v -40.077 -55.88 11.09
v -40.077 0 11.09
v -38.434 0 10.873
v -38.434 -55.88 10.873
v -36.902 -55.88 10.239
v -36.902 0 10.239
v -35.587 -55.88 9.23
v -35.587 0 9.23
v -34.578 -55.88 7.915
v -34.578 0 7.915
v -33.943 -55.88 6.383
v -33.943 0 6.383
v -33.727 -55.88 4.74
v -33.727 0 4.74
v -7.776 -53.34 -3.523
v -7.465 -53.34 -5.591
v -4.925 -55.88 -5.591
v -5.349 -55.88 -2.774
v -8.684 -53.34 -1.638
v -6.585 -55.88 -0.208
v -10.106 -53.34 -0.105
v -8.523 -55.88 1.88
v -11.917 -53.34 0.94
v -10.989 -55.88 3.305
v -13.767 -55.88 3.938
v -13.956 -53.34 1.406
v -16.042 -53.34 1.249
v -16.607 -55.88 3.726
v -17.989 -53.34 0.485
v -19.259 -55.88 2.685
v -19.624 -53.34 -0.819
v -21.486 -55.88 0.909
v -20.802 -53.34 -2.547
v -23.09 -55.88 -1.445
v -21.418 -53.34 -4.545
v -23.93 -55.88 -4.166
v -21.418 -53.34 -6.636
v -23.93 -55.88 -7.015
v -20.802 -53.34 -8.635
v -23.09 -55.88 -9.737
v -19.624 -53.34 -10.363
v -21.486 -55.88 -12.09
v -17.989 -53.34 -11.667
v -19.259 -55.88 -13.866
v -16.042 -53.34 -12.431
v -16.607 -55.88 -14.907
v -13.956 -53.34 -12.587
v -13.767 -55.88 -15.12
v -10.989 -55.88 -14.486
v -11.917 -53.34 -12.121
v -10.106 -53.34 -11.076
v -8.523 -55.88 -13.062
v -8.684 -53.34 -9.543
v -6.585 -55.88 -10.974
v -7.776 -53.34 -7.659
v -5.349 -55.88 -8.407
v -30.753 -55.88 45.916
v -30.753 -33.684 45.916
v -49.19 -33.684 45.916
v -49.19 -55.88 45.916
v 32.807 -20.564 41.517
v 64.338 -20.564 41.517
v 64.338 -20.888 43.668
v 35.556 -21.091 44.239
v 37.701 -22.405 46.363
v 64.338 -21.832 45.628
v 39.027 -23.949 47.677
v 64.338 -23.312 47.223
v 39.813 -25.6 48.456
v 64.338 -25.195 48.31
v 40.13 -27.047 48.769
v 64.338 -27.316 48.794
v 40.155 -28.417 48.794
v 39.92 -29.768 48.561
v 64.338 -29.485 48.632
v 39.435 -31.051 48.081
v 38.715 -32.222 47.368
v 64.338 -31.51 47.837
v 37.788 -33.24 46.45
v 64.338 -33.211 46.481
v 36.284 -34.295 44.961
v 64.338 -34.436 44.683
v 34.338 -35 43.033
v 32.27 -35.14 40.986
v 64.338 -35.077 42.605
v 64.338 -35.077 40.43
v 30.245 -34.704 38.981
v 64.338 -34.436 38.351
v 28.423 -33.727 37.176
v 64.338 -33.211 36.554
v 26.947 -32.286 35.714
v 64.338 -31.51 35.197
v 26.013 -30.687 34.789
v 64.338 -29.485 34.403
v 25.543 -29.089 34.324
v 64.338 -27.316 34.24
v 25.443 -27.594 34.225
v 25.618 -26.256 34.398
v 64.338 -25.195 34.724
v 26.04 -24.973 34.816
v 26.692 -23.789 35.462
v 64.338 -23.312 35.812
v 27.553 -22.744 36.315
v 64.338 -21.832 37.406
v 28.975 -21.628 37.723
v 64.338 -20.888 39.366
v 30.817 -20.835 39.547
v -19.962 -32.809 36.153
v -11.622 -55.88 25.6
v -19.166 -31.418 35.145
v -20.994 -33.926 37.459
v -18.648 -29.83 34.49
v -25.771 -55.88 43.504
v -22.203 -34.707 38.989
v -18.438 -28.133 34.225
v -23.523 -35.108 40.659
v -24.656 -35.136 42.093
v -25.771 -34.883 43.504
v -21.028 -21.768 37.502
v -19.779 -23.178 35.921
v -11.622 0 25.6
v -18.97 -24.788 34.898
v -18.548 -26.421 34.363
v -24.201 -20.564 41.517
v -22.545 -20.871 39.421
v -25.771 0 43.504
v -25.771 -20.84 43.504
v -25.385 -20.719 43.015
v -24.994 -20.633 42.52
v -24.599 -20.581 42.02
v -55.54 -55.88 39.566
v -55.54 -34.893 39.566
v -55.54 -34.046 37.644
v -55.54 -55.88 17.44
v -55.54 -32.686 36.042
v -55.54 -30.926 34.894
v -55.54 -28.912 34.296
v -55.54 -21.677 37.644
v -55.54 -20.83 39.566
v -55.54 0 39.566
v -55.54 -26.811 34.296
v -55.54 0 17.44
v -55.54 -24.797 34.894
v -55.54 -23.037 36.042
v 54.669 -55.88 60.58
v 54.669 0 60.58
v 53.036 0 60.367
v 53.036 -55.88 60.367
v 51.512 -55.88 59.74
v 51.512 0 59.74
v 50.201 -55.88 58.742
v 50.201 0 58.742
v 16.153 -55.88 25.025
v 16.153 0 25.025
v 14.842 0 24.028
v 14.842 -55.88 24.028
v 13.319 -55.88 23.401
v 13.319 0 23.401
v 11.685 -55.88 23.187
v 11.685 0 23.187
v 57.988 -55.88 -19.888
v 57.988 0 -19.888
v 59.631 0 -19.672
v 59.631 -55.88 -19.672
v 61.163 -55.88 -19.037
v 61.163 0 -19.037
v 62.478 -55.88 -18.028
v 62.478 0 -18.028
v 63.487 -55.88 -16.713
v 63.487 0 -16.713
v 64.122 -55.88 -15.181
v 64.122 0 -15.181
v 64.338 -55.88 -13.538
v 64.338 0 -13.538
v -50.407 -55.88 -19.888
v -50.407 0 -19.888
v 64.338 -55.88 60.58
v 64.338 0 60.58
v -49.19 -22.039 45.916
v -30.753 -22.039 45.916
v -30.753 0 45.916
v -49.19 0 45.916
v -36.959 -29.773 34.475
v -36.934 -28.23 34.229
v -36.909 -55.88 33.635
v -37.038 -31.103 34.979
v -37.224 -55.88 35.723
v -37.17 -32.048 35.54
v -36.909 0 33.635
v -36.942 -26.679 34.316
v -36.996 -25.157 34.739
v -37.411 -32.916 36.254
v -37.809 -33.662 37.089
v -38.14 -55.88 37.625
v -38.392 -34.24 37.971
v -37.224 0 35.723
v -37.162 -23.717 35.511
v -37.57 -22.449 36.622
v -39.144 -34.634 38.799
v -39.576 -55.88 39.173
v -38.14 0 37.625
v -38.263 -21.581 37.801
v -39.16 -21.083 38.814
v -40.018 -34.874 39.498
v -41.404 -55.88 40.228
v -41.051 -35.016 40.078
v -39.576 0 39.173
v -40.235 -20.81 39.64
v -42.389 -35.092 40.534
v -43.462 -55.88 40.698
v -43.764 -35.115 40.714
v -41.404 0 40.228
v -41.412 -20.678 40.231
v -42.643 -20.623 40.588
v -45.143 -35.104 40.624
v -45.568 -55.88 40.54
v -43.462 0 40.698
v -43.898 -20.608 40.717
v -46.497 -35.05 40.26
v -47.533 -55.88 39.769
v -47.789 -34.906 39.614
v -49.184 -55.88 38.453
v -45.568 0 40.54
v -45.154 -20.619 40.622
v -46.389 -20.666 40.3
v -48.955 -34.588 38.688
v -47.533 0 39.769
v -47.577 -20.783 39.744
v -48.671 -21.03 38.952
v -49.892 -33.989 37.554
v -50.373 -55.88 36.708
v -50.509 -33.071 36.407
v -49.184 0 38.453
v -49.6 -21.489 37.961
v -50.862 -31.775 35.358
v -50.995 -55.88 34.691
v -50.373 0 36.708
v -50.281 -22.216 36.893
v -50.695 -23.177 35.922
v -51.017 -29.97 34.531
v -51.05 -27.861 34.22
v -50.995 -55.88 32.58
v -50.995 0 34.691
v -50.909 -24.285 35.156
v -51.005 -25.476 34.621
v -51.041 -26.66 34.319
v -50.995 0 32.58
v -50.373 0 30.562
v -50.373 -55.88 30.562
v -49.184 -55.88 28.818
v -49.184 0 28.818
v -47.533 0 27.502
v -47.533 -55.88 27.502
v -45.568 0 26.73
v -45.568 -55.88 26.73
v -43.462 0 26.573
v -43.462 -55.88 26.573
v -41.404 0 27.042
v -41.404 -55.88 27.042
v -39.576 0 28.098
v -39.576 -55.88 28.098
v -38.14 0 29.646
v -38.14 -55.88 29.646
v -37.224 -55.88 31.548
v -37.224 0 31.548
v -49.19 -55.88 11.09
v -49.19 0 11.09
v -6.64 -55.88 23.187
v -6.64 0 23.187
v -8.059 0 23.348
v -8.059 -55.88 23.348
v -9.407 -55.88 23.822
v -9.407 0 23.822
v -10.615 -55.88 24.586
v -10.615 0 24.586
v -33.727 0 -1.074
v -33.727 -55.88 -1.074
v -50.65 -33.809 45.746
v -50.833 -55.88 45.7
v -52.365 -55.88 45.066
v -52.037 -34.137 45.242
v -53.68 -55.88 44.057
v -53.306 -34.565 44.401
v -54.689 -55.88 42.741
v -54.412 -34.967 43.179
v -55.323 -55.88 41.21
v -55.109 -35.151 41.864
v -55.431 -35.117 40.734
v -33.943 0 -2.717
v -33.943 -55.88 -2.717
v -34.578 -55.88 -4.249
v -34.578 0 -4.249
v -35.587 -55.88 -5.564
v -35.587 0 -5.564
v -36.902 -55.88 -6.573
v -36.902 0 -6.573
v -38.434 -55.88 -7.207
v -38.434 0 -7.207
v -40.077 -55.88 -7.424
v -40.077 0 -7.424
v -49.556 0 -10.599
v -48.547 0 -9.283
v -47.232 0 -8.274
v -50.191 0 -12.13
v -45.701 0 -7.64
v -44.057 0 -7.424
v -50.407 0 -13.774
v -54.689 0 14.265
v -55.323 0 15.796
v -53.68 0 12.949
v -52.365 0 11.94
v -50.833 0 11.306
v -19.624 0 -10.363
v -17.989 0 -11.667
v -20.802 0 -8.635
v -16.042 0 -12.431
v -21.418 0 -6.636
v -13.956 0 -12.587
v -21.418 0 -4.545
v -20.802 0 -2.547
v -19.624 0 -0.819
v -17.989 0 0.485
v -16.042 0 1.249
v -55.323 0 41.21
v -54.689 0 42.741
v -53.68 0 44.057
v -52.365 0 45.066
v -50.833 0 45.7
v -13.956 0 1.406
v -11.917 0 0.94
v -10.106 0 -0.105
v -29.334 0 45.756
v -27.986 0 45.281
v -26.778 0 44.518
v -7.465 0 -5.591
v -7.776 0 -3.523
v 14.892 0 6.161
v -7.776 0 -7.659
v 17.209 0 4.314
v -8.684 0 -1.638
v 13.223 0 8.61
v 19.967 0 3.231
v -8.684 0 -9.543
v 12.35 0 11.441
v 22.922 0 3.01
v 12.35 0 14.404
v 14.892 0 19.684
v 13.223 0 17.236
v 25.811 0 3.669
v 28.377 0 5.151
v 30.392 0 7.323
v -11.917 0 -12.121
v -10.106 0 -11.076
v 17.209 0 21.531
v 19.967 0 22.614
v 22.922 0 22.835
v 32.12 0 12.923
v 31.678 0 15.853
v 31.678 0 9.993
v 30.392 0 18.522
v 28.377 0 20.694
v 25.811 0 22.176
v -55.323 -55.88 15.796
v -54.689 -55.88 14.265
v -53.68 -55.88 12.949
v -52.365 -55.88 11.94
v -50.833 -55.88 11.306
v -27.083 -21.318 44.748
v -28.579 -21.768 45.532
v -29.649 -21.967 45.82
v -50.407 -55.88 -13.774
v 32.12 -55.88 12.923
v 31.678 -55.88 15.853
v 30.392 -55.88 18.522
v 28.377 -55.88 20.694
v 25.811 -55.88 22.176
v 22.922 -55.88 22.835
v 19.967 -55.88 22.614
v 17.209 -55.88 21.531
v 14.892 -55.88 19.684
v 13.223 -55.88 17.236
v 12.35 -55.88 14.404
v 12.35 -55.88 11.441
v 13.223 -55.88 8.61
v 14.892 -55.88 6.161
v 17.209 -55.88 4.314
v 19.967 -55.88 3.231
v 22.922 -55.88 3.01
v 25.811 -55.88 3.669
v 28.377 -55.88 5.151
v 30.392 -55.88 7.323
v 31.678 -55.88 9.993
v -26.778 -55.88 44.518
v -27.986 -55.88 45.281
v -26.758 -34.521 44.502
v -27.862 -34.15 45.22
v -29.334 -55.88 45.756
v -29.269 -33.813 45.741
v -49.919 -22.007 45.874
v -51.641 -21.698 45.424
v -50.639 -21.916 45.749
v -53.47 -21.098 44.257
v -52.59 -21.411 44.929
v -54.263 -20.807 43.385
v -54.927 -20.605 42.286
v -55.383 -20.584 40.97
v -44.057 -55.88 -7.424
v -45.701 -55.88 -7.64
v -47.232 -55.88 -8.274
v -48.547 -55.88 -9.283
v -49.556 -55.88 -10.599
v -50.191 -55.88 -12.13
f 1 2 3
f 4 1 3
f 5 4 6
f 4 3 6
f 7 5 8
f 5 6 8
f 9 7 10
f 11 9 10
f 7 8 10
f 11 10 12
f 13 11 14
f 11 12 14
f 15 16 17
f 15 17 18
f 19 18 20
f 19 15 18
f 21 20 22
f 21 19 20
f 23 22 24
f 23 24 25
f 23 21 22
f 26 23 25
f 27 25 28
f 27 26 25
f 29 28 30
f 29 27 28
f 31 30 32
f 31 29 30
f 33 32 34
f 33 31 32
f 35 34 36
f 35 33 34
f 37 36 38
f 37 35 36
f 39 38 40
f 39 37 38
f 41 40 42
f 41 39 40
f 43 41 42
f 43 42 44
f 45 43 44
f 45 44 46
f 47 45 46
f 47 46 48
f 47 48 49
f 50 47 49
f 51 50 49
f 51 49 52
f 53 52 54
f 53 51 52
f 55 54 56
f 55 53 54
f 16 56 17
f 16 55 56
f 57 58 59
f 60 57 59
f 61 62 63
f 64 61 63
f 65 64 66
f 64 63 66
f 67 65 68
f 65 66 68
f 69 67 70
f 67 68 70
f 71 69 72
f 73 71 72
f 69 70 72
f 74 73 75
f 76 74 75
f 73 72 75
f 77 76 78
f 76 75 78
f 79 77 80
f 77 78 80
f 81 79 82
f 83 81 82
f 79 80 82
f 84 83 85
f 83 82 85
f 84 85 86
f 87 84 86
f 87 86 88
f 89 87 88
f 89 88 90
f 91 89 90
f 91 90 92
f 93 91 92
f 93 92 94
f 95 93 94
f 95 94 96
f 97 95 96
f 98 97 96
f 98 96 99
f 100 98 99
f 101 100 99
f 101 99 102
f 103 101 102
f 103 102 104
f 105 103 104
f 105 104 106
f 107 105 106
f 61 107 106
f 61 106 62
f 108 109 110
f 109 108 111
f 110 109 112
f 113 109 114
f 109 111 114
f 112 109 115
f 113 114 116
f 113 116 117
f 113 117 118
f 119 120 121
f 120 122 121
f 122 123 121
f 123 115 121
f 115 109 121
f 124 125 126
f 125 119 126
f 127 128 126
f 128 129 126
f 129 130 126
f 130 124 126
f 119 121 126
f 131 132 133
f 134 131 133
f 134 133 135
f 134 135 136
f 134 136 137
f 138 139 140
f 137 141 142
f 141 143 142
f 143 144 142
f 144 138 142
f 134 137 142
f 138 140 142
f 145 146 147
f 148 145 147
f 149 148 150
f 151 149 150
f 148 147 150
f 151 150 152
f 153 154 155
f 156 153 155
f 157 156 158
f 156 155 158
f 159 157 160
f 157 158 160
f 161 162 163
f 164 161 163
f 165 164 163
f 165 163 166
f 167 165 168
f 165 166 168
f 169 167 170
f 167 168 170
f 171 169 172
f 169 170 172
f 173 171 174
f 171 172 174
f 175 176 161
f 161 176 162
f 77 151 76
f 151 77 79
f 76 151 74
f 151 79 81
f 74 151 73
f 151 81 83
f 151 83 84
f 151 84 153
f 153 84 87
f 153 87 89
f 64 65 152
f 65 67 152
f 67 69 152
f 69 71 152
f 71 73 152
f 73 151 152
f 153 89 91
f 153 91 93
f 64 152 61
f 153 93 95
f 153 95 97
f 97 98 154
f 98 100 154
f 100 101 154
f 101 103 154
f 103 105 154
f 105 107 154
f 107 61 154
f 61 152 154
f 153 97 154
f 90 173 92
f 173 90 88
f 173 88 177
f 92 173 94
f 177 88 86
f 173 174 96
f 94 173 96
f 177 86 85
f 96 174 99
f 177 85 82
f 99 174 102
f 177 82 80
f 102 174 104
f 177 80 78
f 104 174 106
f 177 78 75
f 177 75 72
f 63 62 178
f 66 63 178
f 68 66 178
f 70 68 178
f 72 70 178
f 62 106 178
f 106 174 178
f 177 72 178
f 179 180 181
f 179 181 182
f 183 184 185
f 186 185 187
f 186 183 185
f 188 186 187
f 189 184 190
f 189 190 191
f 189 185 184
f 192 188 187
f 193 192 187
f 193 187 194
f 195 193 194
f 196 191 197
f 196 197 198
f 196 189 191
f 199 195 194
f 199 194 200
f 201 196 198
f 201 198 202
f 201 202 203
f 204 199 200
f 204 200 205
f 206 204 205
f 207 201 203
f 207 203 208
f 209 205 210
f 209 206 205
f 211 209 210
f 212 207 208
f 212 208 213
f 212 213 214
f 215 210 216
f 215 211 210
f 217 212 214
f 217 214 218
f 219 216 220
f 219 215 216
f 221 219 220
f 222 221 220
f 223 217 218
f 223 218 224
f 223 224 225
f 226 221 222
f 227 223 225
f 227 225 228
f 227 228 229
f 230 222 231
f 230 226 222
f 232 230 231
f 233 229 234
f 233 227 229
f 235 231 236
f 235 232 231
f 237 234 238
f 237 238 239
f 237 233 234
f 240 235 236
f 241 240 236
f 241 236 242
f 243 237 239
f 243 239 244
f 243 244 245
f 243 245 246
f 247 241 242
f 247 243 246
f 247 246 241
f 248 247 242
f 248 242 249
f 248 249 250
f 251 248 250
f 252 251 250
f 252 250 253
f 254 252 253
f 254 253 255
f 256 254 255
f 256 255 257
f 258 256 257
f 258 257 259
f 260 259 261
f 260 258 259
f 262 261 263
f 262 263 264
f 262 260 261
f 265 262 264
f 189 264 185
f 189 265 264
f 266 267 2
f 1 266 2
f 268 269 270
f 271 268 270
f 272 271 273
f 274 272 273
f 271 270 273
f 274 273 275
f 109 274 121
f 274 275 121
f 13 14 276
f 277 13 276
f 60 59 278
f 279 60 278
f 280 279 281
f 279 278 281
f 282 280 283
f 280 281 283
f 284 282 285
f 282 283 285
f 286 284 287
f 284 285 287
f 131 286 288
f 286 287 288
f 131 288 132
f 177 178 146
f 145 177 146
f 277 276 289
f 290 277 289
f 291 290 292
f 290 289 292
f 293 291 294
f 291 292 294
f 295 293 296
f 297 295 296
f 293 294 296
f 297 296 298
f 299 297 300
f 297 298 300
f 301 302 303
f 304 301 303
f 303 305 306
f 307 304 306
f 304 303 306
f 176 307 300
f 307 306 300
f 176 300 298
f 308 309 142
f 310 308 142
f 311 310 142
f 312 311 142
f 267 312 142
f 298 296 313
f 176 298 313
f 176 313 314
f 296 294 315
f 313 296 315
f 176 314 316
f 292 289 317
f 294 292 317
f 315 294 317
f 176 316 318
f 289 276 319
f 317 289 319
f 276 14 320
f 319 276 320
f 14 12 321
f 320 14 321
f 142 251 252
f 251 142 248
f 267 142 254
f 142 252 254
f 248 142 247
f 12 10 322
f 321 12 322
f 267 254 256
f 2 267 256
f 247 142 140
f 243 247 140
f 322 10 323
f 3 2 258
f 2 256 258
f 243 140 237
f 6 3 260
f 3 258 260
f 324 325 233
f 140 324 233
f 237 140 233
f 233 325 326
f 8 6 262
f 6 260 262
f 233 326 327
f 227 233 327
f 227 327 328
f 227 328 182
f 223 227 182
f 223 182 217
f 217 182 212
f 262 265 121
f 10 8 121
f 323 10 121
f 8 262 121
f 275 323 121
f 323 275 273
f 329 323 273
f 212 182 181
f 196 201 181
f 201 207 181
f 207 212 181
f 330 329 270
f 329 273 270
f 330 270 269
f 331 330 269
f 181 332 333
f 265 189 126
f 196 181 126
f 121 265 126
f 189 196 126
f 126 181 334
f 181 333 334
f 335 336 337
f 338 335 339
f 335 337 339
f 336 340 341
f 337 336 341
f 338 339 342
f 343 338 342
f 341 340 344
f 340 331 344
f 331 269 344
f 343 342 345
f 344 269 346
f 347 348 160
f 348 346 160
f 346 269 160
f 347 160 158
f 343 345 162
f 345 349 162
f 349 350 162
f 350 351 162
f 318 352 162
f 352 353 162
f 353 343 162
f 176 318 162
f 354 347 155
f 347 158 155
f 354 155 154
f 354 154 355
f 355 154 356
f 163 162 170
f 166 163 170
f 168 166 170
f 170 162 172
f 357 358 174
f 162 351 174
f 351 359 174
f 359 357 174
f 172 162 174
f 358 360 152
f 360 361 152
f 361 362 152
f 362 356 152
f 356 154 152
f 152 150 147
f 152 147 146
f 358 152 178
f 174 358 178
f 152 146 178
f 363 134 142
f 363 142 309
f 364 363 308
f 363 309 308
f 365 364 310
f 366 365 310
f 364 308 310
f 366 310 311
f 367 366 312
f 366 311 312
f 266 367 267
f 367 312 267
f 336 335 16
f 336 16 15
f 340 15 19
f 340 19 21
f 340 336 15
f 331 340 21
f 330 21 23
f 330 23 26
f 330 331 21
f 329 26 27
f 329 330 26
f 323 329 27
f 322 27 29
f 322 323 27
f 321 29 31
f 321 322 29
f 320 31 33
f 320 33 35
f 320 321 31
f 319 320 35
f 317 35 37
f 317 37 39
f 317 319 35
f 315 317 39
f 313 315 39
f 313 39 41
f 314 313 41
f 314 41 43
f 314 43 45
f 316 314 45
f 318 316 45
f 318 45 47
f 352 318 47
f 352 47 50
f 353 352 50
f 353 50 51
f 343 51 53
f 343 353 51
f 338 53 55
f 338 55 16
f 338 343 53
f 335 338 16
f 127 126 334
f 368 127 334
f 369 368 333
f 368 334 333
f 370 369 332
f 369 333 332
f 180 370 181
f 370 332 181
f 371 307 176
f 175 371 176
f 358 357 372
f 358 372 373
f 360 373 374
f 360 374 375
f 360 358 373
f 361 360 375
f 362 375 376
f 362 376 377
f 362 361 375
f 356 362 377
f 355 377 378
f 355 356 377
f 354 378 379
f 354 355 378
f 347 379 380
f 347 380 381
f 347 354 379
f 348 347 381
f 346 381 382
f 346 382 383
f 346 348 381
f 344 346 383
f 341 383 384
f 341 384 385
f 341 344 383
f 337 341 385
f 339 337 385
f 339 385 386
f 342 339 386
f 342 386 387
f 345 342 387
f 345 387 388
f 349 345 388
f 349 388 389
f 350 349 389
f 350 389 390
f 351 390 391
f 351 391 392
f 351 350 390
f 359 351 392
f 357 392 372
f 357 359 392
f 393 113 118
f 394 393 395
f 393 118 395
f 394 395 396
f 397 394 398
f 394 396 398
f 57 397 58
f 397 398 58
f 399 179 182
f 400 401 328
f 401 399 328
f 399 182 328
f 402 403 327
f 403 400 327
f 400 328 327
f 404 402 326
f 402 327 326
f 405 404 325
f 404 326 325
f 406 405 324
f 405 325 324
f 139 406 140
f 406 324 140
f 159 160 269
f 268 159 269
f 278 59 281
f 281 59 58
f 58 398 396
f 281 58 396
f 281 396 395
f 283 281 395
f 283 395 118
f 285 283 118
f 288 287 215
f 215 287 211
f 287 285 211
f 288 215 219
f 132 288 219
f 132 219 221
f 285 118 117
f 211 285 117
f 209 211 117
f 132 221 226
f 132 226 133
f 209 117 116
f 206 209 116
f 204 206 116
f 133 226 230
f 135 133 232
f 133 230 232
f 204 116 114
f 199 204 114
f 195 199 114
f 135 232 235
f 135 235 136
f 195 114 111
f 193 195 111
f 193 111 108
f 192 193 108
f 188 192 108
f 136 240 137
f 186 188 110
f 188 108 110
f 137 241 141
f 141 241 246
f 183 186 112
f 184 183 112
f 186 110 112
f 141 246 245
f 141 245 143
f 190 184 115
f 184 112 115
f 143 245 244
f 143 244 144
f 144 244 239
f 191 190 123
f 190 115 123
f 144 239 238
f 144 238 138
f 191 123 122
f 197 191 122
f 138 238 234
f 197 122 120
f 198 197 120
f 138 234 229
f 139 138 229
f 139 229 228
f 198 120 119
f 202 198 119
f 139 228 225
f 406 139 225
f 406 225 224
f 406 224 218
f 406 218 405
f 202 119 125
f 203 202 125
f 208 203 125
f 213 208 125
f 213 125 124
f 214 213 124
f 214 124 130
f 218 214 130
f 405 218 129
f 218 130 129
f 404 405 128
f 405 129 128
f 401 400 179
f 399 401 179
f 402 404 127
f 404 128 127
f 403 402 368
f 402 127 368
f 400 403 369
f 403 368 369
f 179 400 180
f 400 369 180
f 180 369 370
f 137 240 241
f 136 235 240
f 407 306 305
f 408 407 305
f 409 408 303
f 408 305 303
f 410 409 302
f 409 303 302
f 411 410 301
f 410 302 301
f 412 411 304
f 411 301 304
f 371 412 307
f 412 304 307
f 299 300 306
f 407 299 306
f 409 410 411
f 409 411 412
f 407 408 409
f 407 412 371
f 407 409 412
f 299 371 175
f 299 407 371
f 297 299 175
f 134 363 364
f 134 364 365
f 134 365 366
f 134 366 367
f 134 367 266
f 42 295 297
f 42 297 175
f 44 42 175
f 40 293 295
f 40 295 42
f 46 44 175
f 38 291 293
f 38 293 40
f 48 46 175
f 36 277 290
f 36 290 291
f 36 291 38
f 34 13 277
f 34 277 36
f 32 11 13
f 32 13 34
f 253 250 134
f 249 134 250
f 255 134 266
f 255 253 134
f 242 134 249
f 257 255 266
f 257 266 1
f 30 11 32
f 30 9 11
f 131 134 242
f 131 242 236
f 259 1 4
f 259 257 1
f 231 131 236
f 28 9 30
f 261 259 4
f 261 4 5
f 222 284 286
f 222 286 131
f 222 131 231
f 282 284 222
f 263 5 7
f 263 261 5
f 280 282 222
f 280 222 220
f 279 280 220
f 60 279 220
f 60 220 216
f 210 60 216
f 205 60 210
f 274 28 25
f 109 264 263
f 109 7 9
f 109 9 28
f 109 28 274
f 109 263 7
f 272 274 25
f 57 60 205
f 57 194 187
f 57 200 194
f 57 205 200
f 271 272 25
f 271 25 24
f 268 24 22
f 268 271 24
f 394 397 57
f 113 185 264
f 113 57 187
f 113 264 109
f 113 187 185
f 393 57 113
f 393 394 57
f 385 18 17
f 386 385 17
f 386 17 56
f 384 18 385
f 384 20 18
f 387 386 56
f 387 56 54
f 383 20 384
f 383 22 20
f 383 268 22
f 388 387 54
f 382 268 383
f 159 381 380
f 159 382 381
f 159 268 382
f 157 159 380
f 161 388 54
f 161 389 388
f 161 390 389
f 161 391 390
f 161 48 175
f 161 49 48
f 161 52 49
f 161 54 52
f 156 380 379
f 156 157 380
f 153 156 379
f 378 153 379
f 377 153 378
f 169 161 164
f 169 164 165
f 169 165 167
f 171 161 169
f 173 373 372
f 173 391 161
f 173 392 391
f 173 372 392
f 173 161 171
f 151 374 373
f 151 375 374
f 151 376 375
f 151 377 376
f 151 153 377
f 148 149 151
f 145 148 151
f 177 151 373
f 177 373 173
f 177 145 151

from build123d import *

# Parameters (mm, degrees)
F0_R       = 7.0158249189
F0_R_2     = 7.6708
F0_R_3     = 9.9404801973
F0_R_4     = 7.0825554901
F1_DEPTH   = 55.88
F2_R       = 7.297507907
F1_FACE1_W = 55.88
F1_FACE1_H = 22.1268048838
F3_DEPTH   = 119.8785358498
F4_SIZE    = 2.54


with BuildPart() as f1:
    # F0 (on Front) → F1 (new body)
    with BuildSketch(Plane.XZ):
        with BuildLine():
            Line((-30.753318463, 45.9163933992), (-49.1895893753, 45.9163933992))
            ThreePointArc((-49.1895893753, 45.9163933992), (-53.6797174358, 44.0565214598), (-55.5395893753, 39.5663933992))
            Line((-55.5395893753, 39.5663933992), (-55.5395893753, 17.4395885155))
            ThreePointArc((-55.5395893753, 17.4395885155), (-53.6797174358, 12.9494604549), (-49.1895893753, 11.0895885155))
            Line((-49.1895893753, 11.0895885155), (-40.0770088494, 11.0895885155))
            ThreePointArc((-40.0770088494, 11.0895885155), (-35.5868807888, 9.229716576), (-33.7270088494, 4.7395885155))
            Line((-33.7270088494, 4.7395885155), (-33.7270088494, -1.0736080982))
            ThreePointArc((-33.7270088494, -1.0736080982), (-35.5868807888, -5.5637361587), (-40.0770088494, -7.4236080982))
            Line((-40.0770088494, -7.4236080982), (-44.0572159529, -7.4236080982))
            ThreePointArc((-44.0572159529, -7.4236080982), (-48.5473440134, -9.2834800376), (-50.4072159529, -13.7736080982))
            Line((-50.4072159529, -13.7736080982), (-50.4072159529, -19.8879390955))
            Line((-50.4072159529, -19.8879390955), (57.9879464746, -19.8879390955))
            ThreePointArc((57.9879464746, -19.8879390955), (62.4780745351, -18.028067156), (64.3379464746, -13.5379390955))
            Line((64.3379464746, -13.5379390955), (64.3379464746, 60.5803094804))
            Line((64.3379464746, 60.5803094804), (54.6690416703, 60.5803094804))
            ThreePointArc((54.6690416703, 60.5803094804), (52.2533179297, 60.1028539723), (50.2008699704, 58.742287058))
            Line((50.2008699704, 58.742287058), (16.1533638011, 25.0253412392))
            ThreePointArc((16.1533638011, 25.0253412392), (14.1009158419, 23.6647743249), (11.6851921012, 23.1873188168))
            Line((11.6851921012, 23.1873188168), (-6.639673132, 23.1873188168))
            ThreePointArc((-6.639673132, 23.1873188168), (-9.4073756693, 23.8222227839), (-11.6216214126, 25.5999730955))
            Line((-11.6216214126, 25.5999730955), (-25.7713701823, 43.5037391206))
            ThreePointArc((-25.7713701823, 43.5037391206), (-27.9856159257, 45.2814894321), (-30.753318463, 45.9163933992))
        make_face()
        with Locations((-14.4806178287, -5.590618588)):
            Circle(F0_R, mode=Mode.SUBTRACT)
        with Locations((48.0243302882, -7.7902064659)):
            Circle(F0_R_2, mode=Mode.SUBTRACT)
        with Locations((22.1791788936, 12.9225775599)):
            Circle(F0_R_3, mode=Mode.SUBTRACT)
        with Locations((-43.9917519689, 33.6353629827)):
            Circle(F0_R_4, mode=Mode.SUBTRACT)
        with Locations((48.0243302882, -7.7902064659)):
            Circle(F0_R_2)
    extrude(amount=F1_DEPTH)

    # F2 (on face) + F1_face1 (on face) → F3 (cut, through all)
    with BuildSketch(Plane.YZ.offset(64.3379464746)):
        with Locations((-27.8614442796, 41.5172167122)):
            Circle(F2_R)
    with BuildSketch(Plane(origin=(-55.5395893753, -27.94, 28.5029909573), x_dir=(0, -1, 0), z_dir=(-1, 0, 0))):
        Rectangle(F1_FACE1_W, F1_FACE1_H)
    extrude(amount=-F3_DEPTH, dir=(1, 0, 0), mode=Mode.SUBTRACT)

    # F4
    f4_edges = [f1.edges().sort_by_distance(p)[0] for p in [
        (-21.496443, -55.88, -5.590619),
    ]]
    chamfer(f4_edges, length=F4_SIZE)


solid = f1.part
